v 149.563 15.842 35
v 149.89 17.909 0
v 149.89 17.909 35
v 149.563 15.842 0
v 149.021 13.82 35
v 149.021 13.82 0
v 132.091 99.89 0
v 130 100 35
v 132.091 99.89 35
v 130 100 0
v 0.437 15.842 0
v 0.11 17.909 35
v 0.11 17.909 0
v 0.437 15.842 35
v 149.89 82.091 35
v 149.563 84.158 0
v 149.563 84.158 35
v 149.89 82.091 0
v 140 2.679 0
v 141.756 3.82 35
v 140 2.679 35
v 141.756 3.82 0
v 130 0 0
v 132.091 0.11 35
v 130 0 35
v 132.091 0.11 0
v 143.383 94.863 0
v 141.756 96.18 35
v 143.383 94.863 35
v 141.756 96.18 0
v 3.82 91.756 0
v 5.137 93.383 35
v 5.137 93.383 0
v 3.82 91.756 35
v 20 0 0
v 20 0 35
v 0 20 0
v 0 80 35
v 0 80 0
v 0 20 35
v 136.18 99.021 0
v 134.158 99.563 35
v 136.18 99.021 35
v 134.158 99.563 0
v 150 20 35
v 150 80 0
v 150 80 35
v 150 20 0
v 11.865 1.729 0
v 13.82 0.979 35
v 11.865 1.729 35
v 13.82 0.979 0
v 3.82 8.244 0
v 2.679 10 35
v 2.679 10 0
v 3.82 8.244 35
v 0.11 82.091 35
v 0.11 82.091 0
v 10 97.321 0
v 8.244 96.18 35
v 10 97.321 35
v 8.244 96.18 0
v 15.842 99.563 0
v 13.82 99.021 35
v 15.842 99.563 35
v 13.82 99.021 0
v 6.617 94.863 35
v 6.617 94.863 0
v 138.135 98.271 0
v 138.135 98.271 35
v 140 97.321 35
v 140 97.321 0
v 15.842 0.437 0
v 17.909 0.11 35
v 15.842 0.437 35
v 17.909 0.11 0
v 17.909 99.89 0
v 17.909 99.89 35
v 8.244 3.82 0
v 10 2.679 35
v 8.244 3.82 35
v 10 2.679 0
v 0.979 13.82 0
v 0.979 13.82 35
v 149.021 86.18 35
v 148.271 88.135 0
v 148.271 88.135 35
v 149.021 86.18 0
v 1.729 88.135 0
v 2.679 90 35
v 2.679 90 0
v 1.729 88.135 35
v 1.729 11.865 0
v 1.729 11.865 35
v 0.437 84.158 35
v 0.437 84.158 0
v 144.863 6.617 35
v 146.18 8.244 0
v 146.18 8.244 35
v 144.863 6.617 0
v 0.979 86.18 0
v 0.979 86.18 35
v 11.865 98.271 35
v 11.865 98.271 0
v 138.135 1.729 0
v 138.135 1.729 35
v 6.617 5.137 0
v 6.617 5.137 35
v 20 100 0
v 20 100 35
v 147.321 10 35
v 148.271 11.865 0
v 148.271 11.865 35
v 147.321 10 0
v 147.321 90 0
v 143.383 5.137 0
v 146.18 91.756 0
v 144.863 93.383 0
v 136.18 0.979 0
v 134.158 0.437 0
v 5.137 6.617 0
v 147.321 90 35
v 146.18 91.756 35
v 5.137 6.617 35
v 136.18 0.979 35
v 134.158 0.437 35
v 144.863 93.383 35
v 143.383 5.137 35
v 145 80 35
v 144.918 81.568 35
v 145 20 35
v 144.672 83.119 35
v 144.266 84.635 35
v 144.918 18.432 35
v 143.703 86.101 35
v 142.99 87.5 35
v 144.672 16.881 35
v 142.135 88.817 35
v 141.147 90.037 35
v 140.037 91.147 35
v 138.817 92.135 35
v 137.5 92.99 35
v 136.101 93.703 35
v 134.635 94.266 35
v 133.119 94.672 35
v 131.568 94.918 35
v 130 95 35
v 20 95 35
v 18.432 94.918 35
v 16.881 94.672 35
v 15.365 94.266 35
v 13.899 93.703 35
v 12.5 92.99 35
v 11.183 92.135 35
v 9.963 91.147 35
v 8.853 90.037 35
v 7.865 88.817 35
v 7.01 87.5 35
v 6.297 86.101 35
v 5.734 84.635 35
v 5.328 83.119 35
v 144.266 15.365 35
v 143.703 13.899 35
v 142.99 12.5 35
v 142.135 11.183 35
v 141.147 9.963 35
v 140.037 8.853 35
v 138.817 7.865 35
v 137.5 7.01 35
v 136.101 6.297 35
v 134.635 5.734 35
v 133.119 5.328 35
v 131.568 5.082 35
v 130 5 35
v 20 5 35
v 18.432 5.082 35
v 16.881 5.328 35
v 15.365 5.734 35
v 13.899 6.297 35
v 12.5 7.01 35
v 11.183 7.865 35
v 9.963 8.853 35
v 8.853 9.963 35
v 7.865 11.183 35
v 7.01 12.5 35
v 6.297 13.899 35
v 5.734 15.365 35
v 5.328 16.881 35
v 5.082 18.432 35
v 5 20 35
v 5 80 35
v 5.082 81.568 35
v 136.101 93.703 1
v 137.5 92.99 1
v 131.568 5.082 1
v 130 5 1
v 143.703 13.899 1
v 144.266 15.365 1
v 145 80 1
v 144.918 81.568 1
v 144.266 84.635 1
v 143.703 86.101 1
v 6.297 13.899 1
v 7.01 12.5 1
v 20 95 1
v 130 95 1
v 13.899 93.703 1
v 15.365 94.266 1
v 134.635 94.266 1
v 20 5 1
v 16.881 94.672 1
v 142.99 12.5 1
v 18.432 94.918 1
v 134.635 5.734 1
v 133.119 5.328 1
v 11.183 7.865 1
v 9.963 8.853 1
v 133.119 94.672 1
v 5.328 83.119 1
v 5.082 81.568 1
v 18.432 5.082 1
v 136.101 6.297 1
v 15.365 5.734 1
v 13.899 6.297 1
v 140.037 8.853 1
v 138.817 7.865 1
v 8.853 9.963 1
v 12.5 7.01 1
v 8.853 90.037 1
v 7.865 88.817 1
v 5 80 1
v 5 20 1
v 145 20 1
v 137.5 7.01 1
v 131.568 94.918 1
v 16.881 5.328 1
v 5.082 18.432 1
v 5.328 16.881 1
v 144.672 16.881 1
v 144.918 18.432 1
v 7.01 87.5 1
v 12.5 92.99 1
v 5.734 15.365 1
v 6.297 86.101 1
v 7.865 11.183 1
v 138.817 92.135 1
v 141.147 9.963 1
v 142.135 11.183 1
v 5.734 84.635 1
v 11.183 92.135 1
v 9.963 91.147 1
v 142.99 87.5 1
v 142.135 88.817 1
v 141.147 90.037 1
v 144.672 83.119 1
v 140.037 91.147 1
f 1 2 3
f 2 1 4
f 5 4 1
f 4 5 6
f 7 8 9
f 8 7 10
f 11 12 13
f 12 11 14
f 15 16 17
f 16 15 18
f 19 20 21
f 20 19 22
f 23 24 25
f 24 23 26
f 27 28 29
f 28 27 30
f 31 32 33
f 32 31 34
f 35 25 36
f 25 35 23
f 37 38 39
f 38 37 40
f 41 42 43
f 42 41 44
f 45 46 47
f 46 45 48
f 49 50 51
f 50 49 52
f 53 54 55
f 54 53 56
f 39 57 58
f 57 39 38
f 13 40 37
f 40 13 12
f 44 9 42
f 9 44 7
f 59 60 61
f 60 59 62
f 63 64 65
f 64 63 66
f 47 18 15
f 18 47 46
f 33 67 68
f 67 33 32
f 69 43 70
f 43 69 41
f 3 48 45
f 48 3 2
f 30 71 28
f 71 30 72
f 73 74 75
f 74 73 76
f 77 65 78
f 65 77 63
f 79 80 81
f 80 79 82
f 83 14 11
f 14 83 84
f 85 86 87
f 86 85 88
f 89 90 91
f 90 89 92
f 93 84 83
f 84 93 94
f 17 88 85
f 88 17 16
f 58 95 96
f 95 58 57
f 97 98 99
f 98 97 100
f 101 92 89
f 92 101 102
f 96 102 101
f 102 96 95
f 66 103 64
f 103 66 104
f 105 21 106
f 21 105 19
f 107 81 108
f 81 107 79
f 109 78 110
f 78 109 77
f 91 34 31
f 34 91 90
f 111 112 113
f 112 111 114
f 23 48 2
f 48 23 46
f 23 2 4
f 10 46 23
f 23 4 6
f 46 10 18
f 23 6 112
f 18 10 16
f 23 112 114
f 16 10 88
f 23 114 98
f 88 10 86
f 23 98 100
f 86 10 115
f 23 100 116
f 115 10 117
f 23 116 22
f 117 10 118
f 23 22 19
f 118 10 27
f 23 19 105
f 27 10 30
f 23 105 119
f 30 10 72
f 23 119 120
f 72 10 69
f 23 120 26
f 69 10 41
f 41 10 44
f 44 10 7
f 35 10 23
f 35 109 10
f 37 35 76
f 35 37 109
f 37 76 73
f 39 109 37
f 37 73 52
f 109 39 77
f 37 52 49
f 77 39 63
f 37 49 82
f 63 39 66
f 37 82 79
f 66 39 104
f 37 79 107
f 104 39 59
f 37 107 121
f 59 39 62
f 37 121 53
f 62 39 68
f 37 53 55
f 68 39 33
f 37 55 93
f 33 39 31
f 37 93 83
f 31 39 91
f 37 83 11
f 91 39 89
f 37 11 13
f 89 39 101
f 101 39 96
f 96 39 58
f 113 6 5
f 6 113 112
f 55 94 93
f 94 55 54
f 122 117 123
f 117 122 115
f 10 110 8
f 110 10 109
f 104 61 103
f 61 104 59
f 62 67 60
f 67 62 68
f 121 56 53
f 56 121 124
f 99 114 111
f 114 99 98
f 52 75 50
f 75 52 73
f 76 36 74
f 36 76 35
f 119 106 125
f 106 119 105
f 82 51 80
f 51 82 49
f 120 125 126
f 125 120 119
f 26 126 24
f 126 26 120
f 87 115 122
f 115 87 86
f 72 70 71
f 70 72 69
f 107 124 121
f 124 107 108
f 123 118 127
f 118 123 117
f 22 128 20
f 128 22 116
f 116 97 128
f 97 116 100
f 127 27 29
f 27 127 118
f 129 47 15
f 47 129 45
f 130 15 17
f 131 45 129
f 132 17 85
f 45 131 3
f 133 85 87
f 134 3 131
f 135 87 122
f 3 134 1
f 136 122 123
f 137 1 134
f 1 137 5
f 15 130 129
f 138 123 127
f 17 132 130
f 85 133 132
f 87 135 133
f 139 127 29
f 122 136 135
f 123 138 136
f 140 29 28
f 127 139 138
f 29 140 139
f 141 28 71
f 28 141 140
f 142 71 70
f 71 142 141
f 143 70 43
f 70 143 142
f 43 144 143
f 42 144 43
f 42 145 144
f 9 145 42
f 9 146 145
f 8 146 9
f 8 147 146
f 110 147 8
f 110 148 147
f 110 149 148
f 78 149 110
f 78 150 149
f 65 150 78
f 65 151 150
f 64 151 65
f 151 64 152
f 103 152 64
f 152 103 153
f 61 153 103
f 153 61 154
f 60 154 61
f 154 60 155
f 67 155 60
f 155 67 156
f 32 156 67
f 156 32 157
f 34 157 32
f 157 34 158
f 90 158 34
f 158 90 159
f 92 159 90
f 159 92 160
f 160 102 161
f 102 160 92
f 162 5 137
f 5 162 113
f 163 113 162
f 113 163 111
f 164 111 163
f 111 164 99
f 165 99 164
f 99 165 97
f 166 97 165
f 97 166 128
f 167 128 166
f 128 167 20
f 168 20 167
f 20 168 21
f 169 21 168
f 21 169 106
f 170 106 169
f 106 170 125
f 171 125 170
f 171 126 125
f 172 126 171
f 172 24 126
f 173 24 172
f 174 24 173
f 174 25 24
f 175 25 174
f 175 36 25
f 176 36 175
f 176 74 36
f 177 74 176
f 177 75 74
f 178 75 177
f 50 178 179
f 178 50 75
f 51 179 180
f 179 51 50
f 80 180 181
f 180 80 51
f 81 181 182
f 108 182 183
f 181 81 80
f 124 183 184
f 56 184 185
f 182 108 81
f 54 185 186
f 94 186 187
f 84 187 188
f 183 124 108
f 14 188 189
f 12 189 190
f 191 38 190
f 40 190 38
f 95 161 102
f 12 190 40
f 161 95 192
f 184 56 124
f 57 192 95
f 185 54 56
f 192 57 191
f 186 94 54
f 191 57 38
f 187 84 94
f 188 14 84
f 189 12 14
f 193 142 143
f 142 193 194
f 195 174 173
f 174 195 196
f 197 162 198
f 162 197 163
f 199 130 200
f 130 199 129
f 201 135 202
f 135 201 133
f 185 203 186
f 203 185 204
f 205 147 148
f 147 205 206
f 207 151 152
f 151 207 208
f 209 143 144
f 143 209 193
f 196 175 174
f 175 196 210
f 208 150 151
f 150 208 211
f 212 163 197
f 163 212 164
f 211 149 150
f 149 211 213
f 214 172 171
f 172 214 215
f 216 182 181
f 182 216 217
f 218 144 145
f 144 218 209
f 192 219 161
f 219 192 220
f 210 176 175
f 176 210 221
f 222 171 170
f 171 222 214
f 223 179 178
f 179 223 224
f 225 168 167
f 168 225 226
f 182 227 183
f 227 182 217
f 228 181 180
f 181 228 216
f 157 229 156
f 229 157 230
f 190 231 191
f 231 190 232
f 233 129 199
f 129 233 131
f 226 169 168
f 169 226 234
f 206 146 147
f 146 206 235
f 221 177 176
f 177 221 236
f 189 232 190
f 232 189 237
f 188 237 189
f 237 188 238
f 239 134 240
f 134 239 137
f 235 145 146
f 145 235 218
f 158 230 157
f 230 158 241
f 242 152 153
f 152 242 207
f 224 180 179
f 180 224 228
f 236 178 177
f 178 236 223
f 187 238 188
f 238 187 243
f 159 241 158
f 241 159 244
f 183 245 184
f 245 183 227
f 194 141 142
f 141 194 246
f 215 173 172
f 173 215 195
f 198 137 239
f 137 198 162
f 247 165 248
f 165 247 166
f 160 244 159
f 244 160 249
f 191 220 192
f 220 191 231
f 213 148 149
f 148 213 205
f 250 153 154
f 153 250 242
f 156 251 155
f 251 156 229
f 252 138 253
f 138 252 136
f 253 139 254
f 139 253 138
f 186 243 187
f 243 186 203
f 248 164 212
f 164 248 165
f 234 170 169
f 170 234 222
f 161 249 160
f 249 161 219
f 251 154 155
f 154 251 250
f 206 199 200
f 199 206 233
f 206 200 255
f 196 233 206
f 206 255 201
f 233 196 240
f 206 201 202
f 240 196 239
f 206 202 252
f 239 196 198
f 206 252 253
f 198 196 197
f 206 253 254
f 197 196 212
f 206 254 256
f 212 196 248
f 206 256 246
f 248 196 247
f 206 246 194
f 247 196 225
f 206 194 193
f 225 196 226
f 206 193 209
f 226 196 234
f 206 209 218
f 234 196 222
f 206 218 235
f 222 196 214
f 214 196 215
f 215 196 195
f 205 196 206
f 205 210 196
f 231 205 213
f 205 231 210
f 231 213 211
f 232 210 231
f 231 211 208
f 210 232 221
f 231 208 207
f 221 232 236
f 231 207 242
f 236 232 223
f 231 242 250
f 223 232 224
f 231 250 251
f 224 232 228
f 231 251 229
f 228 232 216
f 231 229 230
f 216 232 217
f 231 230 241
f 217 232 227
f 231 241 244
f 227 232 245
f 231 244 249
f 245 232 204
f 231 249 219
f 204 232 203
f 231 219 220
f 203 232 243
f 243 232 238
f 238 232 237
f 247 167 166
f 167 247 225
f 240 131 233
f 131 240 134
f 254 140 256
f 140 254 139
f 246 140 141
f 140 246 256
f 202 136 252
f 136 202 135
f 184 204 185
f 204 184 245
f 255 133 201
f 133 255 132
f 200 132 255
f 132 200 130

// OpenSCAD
// bftcover.scad
// BFT Cover template
// 
// Copyright (C) 2015 Christopher Roberts
//
// This program is free software: you can redistribute it and/or modify
// it under the terms of the GNU General Public License as published by
// the Free Software Foundation, either version 3 of the License, or
// (at your option) any later version.
// 
// This program is distributed in the hope that it will be useful,
// but WITHOUT ANY WARRANTY; without even the implied warranty of
// MERCHANTABILITY or FITNESS FOR A PARTICULAR PURPOSE.  See the
// GNU General Public License for more details.
// 
// You should have received a copy of the GNU General Public License
// along with this program.  If not, see <http://www.gnu.org/licenses/>.


// Global Parameters
height        = 35;
width         = 150;
depth         = 100;
corner_radius = 20;
outerwall     = 5;
$fn           = 60;

module bftcover() {

    difference() {

        // Things that exist
        union() {
            hull () {
                translate( v = [corner_radius, corner_radius, 0] )                 cylinder( h = height, r = corner_radius );
                translate( v = [width - corner_radius, corner_radius, 0] )         cylinder( h = height, r = corner_radius );
                translate( v = [corner_radius, depth - corner_radius, 0] )         cylinder( h = height, r = corner_radius );
                translate( v = [width - corner_radius, depth - corner_radius, 0] ) cylinder( h = height, r = corner_radius );
            }

        }

        // Things to be cut out
        union() {
            hull() {
                translate( v = [corner_radius, corner_radius, 1] )                 color("red")    cylinder( h = height, r = corner_radius - outerwall );
                translate( v = [width - corner_radius, corner_radius, 1] )         color("yellow") cylinder( h = height, r = corner_radius - outerwall );
                translate( v = [corner_radius, depth - corner_radius, 1] )         color("blue")   cylinder( h = height, r = corner_radius - outerwall );
                translate( v = [width - corner_radius, depth - corner_radius, 1] ) color("green")  cylinder( h = height, r = corner_radius - outerwall );
            }

        }
    }

}

module sizecheck() {
    difference() {
        color("pink") cube( size = [width, depth, 1]);
        translate( v = [outerwall, outerwall, -1]) cube( size = [width - outerwall*2, depth - outerwall*2, 3]);
    }
}

bftcover();
//translate( v = [0, 0, height + 2]) sizecheck();

// -------------------------------------------------------------------------------------------
// Commands
// -------------------------------------------------------------------------------------------

// http://en.wikibooks.org/wiki/OpenSCAD_User_Manual

// primitives
// cube(size = [1,2,3], center = true);
// sphere( r = 10, $fn=100 );
// circle( r = 10 );
// cylinder( h = 10, r = 20, $fs = 6, center = true );
// cylinder( h = 10, r1 = 10, r2 = 20, $fs = 6, center = false );
// polyhedron(points = [ [x, y, z], ... ], triangles = [ [p1, p2, p3..], ... ], convexity = N);
// polygon(points = [ [x, y], ... ], paths = [ [p1, p2, p3..], ... ], convexity = N);

// transormations
// scale(v = [x, y, z]) { ... }
// rotate(a=[0,180,0]) { ... }
// translate(v = [x, y, z]) { ... }
// mirror([ 0, 1, 0 ]) { ... }

// rounded box by combining a cube and single cylinder
// $fn=50;
// minkowski() {
//   cube([10,10,1]);
//   cylinder(r=2,h=1);
// }

// hull() {
//   translate([15,10,0]) circle(10);
//   circle(10);
// }

// linear_extrude(height=1, convexity = 1) import("tridentlogo.dxf");
// deprecated - dxf_linear_extrude(file="tridentlogo.dxf", height = 1, center = false, convexity = 10);
// deprecated - import_dxf(file="design.dxf", layer="layername", origin = [100,100], scale = 0.5);
// linear_extrude(height = 10, center = true, convexity = 10, twist = 0, $fn = 100)
// rotate_extrude(convexity = 10, $fn = 100)
// import_stl("example012.stl", convexity = 5);

// for (z = [-1, 1] ) { ... } // two iterations, z = -1, z = 1
// for (z = [ 0 : 5 ] ) { ... } // range of interations step 1
// for (z = [ 0 : 2 : 5 ] ) { ... } // range of interations step 2

// for (i = [ [ 0, 0, 0 ], [...] ] ) { ... } // range of rotations or vectors
// usage say rotate($i) or translate($i)
// if ( x > y ) { ... } else { ... }
// assign (angle = i*360/20, distance = i*10, r = i*2)

// text http://www.thingiverse.com/thing:25036
// inkscape / select all items
// objects to path
// select the object to export
// extensions / generate from path / paths to openscad
